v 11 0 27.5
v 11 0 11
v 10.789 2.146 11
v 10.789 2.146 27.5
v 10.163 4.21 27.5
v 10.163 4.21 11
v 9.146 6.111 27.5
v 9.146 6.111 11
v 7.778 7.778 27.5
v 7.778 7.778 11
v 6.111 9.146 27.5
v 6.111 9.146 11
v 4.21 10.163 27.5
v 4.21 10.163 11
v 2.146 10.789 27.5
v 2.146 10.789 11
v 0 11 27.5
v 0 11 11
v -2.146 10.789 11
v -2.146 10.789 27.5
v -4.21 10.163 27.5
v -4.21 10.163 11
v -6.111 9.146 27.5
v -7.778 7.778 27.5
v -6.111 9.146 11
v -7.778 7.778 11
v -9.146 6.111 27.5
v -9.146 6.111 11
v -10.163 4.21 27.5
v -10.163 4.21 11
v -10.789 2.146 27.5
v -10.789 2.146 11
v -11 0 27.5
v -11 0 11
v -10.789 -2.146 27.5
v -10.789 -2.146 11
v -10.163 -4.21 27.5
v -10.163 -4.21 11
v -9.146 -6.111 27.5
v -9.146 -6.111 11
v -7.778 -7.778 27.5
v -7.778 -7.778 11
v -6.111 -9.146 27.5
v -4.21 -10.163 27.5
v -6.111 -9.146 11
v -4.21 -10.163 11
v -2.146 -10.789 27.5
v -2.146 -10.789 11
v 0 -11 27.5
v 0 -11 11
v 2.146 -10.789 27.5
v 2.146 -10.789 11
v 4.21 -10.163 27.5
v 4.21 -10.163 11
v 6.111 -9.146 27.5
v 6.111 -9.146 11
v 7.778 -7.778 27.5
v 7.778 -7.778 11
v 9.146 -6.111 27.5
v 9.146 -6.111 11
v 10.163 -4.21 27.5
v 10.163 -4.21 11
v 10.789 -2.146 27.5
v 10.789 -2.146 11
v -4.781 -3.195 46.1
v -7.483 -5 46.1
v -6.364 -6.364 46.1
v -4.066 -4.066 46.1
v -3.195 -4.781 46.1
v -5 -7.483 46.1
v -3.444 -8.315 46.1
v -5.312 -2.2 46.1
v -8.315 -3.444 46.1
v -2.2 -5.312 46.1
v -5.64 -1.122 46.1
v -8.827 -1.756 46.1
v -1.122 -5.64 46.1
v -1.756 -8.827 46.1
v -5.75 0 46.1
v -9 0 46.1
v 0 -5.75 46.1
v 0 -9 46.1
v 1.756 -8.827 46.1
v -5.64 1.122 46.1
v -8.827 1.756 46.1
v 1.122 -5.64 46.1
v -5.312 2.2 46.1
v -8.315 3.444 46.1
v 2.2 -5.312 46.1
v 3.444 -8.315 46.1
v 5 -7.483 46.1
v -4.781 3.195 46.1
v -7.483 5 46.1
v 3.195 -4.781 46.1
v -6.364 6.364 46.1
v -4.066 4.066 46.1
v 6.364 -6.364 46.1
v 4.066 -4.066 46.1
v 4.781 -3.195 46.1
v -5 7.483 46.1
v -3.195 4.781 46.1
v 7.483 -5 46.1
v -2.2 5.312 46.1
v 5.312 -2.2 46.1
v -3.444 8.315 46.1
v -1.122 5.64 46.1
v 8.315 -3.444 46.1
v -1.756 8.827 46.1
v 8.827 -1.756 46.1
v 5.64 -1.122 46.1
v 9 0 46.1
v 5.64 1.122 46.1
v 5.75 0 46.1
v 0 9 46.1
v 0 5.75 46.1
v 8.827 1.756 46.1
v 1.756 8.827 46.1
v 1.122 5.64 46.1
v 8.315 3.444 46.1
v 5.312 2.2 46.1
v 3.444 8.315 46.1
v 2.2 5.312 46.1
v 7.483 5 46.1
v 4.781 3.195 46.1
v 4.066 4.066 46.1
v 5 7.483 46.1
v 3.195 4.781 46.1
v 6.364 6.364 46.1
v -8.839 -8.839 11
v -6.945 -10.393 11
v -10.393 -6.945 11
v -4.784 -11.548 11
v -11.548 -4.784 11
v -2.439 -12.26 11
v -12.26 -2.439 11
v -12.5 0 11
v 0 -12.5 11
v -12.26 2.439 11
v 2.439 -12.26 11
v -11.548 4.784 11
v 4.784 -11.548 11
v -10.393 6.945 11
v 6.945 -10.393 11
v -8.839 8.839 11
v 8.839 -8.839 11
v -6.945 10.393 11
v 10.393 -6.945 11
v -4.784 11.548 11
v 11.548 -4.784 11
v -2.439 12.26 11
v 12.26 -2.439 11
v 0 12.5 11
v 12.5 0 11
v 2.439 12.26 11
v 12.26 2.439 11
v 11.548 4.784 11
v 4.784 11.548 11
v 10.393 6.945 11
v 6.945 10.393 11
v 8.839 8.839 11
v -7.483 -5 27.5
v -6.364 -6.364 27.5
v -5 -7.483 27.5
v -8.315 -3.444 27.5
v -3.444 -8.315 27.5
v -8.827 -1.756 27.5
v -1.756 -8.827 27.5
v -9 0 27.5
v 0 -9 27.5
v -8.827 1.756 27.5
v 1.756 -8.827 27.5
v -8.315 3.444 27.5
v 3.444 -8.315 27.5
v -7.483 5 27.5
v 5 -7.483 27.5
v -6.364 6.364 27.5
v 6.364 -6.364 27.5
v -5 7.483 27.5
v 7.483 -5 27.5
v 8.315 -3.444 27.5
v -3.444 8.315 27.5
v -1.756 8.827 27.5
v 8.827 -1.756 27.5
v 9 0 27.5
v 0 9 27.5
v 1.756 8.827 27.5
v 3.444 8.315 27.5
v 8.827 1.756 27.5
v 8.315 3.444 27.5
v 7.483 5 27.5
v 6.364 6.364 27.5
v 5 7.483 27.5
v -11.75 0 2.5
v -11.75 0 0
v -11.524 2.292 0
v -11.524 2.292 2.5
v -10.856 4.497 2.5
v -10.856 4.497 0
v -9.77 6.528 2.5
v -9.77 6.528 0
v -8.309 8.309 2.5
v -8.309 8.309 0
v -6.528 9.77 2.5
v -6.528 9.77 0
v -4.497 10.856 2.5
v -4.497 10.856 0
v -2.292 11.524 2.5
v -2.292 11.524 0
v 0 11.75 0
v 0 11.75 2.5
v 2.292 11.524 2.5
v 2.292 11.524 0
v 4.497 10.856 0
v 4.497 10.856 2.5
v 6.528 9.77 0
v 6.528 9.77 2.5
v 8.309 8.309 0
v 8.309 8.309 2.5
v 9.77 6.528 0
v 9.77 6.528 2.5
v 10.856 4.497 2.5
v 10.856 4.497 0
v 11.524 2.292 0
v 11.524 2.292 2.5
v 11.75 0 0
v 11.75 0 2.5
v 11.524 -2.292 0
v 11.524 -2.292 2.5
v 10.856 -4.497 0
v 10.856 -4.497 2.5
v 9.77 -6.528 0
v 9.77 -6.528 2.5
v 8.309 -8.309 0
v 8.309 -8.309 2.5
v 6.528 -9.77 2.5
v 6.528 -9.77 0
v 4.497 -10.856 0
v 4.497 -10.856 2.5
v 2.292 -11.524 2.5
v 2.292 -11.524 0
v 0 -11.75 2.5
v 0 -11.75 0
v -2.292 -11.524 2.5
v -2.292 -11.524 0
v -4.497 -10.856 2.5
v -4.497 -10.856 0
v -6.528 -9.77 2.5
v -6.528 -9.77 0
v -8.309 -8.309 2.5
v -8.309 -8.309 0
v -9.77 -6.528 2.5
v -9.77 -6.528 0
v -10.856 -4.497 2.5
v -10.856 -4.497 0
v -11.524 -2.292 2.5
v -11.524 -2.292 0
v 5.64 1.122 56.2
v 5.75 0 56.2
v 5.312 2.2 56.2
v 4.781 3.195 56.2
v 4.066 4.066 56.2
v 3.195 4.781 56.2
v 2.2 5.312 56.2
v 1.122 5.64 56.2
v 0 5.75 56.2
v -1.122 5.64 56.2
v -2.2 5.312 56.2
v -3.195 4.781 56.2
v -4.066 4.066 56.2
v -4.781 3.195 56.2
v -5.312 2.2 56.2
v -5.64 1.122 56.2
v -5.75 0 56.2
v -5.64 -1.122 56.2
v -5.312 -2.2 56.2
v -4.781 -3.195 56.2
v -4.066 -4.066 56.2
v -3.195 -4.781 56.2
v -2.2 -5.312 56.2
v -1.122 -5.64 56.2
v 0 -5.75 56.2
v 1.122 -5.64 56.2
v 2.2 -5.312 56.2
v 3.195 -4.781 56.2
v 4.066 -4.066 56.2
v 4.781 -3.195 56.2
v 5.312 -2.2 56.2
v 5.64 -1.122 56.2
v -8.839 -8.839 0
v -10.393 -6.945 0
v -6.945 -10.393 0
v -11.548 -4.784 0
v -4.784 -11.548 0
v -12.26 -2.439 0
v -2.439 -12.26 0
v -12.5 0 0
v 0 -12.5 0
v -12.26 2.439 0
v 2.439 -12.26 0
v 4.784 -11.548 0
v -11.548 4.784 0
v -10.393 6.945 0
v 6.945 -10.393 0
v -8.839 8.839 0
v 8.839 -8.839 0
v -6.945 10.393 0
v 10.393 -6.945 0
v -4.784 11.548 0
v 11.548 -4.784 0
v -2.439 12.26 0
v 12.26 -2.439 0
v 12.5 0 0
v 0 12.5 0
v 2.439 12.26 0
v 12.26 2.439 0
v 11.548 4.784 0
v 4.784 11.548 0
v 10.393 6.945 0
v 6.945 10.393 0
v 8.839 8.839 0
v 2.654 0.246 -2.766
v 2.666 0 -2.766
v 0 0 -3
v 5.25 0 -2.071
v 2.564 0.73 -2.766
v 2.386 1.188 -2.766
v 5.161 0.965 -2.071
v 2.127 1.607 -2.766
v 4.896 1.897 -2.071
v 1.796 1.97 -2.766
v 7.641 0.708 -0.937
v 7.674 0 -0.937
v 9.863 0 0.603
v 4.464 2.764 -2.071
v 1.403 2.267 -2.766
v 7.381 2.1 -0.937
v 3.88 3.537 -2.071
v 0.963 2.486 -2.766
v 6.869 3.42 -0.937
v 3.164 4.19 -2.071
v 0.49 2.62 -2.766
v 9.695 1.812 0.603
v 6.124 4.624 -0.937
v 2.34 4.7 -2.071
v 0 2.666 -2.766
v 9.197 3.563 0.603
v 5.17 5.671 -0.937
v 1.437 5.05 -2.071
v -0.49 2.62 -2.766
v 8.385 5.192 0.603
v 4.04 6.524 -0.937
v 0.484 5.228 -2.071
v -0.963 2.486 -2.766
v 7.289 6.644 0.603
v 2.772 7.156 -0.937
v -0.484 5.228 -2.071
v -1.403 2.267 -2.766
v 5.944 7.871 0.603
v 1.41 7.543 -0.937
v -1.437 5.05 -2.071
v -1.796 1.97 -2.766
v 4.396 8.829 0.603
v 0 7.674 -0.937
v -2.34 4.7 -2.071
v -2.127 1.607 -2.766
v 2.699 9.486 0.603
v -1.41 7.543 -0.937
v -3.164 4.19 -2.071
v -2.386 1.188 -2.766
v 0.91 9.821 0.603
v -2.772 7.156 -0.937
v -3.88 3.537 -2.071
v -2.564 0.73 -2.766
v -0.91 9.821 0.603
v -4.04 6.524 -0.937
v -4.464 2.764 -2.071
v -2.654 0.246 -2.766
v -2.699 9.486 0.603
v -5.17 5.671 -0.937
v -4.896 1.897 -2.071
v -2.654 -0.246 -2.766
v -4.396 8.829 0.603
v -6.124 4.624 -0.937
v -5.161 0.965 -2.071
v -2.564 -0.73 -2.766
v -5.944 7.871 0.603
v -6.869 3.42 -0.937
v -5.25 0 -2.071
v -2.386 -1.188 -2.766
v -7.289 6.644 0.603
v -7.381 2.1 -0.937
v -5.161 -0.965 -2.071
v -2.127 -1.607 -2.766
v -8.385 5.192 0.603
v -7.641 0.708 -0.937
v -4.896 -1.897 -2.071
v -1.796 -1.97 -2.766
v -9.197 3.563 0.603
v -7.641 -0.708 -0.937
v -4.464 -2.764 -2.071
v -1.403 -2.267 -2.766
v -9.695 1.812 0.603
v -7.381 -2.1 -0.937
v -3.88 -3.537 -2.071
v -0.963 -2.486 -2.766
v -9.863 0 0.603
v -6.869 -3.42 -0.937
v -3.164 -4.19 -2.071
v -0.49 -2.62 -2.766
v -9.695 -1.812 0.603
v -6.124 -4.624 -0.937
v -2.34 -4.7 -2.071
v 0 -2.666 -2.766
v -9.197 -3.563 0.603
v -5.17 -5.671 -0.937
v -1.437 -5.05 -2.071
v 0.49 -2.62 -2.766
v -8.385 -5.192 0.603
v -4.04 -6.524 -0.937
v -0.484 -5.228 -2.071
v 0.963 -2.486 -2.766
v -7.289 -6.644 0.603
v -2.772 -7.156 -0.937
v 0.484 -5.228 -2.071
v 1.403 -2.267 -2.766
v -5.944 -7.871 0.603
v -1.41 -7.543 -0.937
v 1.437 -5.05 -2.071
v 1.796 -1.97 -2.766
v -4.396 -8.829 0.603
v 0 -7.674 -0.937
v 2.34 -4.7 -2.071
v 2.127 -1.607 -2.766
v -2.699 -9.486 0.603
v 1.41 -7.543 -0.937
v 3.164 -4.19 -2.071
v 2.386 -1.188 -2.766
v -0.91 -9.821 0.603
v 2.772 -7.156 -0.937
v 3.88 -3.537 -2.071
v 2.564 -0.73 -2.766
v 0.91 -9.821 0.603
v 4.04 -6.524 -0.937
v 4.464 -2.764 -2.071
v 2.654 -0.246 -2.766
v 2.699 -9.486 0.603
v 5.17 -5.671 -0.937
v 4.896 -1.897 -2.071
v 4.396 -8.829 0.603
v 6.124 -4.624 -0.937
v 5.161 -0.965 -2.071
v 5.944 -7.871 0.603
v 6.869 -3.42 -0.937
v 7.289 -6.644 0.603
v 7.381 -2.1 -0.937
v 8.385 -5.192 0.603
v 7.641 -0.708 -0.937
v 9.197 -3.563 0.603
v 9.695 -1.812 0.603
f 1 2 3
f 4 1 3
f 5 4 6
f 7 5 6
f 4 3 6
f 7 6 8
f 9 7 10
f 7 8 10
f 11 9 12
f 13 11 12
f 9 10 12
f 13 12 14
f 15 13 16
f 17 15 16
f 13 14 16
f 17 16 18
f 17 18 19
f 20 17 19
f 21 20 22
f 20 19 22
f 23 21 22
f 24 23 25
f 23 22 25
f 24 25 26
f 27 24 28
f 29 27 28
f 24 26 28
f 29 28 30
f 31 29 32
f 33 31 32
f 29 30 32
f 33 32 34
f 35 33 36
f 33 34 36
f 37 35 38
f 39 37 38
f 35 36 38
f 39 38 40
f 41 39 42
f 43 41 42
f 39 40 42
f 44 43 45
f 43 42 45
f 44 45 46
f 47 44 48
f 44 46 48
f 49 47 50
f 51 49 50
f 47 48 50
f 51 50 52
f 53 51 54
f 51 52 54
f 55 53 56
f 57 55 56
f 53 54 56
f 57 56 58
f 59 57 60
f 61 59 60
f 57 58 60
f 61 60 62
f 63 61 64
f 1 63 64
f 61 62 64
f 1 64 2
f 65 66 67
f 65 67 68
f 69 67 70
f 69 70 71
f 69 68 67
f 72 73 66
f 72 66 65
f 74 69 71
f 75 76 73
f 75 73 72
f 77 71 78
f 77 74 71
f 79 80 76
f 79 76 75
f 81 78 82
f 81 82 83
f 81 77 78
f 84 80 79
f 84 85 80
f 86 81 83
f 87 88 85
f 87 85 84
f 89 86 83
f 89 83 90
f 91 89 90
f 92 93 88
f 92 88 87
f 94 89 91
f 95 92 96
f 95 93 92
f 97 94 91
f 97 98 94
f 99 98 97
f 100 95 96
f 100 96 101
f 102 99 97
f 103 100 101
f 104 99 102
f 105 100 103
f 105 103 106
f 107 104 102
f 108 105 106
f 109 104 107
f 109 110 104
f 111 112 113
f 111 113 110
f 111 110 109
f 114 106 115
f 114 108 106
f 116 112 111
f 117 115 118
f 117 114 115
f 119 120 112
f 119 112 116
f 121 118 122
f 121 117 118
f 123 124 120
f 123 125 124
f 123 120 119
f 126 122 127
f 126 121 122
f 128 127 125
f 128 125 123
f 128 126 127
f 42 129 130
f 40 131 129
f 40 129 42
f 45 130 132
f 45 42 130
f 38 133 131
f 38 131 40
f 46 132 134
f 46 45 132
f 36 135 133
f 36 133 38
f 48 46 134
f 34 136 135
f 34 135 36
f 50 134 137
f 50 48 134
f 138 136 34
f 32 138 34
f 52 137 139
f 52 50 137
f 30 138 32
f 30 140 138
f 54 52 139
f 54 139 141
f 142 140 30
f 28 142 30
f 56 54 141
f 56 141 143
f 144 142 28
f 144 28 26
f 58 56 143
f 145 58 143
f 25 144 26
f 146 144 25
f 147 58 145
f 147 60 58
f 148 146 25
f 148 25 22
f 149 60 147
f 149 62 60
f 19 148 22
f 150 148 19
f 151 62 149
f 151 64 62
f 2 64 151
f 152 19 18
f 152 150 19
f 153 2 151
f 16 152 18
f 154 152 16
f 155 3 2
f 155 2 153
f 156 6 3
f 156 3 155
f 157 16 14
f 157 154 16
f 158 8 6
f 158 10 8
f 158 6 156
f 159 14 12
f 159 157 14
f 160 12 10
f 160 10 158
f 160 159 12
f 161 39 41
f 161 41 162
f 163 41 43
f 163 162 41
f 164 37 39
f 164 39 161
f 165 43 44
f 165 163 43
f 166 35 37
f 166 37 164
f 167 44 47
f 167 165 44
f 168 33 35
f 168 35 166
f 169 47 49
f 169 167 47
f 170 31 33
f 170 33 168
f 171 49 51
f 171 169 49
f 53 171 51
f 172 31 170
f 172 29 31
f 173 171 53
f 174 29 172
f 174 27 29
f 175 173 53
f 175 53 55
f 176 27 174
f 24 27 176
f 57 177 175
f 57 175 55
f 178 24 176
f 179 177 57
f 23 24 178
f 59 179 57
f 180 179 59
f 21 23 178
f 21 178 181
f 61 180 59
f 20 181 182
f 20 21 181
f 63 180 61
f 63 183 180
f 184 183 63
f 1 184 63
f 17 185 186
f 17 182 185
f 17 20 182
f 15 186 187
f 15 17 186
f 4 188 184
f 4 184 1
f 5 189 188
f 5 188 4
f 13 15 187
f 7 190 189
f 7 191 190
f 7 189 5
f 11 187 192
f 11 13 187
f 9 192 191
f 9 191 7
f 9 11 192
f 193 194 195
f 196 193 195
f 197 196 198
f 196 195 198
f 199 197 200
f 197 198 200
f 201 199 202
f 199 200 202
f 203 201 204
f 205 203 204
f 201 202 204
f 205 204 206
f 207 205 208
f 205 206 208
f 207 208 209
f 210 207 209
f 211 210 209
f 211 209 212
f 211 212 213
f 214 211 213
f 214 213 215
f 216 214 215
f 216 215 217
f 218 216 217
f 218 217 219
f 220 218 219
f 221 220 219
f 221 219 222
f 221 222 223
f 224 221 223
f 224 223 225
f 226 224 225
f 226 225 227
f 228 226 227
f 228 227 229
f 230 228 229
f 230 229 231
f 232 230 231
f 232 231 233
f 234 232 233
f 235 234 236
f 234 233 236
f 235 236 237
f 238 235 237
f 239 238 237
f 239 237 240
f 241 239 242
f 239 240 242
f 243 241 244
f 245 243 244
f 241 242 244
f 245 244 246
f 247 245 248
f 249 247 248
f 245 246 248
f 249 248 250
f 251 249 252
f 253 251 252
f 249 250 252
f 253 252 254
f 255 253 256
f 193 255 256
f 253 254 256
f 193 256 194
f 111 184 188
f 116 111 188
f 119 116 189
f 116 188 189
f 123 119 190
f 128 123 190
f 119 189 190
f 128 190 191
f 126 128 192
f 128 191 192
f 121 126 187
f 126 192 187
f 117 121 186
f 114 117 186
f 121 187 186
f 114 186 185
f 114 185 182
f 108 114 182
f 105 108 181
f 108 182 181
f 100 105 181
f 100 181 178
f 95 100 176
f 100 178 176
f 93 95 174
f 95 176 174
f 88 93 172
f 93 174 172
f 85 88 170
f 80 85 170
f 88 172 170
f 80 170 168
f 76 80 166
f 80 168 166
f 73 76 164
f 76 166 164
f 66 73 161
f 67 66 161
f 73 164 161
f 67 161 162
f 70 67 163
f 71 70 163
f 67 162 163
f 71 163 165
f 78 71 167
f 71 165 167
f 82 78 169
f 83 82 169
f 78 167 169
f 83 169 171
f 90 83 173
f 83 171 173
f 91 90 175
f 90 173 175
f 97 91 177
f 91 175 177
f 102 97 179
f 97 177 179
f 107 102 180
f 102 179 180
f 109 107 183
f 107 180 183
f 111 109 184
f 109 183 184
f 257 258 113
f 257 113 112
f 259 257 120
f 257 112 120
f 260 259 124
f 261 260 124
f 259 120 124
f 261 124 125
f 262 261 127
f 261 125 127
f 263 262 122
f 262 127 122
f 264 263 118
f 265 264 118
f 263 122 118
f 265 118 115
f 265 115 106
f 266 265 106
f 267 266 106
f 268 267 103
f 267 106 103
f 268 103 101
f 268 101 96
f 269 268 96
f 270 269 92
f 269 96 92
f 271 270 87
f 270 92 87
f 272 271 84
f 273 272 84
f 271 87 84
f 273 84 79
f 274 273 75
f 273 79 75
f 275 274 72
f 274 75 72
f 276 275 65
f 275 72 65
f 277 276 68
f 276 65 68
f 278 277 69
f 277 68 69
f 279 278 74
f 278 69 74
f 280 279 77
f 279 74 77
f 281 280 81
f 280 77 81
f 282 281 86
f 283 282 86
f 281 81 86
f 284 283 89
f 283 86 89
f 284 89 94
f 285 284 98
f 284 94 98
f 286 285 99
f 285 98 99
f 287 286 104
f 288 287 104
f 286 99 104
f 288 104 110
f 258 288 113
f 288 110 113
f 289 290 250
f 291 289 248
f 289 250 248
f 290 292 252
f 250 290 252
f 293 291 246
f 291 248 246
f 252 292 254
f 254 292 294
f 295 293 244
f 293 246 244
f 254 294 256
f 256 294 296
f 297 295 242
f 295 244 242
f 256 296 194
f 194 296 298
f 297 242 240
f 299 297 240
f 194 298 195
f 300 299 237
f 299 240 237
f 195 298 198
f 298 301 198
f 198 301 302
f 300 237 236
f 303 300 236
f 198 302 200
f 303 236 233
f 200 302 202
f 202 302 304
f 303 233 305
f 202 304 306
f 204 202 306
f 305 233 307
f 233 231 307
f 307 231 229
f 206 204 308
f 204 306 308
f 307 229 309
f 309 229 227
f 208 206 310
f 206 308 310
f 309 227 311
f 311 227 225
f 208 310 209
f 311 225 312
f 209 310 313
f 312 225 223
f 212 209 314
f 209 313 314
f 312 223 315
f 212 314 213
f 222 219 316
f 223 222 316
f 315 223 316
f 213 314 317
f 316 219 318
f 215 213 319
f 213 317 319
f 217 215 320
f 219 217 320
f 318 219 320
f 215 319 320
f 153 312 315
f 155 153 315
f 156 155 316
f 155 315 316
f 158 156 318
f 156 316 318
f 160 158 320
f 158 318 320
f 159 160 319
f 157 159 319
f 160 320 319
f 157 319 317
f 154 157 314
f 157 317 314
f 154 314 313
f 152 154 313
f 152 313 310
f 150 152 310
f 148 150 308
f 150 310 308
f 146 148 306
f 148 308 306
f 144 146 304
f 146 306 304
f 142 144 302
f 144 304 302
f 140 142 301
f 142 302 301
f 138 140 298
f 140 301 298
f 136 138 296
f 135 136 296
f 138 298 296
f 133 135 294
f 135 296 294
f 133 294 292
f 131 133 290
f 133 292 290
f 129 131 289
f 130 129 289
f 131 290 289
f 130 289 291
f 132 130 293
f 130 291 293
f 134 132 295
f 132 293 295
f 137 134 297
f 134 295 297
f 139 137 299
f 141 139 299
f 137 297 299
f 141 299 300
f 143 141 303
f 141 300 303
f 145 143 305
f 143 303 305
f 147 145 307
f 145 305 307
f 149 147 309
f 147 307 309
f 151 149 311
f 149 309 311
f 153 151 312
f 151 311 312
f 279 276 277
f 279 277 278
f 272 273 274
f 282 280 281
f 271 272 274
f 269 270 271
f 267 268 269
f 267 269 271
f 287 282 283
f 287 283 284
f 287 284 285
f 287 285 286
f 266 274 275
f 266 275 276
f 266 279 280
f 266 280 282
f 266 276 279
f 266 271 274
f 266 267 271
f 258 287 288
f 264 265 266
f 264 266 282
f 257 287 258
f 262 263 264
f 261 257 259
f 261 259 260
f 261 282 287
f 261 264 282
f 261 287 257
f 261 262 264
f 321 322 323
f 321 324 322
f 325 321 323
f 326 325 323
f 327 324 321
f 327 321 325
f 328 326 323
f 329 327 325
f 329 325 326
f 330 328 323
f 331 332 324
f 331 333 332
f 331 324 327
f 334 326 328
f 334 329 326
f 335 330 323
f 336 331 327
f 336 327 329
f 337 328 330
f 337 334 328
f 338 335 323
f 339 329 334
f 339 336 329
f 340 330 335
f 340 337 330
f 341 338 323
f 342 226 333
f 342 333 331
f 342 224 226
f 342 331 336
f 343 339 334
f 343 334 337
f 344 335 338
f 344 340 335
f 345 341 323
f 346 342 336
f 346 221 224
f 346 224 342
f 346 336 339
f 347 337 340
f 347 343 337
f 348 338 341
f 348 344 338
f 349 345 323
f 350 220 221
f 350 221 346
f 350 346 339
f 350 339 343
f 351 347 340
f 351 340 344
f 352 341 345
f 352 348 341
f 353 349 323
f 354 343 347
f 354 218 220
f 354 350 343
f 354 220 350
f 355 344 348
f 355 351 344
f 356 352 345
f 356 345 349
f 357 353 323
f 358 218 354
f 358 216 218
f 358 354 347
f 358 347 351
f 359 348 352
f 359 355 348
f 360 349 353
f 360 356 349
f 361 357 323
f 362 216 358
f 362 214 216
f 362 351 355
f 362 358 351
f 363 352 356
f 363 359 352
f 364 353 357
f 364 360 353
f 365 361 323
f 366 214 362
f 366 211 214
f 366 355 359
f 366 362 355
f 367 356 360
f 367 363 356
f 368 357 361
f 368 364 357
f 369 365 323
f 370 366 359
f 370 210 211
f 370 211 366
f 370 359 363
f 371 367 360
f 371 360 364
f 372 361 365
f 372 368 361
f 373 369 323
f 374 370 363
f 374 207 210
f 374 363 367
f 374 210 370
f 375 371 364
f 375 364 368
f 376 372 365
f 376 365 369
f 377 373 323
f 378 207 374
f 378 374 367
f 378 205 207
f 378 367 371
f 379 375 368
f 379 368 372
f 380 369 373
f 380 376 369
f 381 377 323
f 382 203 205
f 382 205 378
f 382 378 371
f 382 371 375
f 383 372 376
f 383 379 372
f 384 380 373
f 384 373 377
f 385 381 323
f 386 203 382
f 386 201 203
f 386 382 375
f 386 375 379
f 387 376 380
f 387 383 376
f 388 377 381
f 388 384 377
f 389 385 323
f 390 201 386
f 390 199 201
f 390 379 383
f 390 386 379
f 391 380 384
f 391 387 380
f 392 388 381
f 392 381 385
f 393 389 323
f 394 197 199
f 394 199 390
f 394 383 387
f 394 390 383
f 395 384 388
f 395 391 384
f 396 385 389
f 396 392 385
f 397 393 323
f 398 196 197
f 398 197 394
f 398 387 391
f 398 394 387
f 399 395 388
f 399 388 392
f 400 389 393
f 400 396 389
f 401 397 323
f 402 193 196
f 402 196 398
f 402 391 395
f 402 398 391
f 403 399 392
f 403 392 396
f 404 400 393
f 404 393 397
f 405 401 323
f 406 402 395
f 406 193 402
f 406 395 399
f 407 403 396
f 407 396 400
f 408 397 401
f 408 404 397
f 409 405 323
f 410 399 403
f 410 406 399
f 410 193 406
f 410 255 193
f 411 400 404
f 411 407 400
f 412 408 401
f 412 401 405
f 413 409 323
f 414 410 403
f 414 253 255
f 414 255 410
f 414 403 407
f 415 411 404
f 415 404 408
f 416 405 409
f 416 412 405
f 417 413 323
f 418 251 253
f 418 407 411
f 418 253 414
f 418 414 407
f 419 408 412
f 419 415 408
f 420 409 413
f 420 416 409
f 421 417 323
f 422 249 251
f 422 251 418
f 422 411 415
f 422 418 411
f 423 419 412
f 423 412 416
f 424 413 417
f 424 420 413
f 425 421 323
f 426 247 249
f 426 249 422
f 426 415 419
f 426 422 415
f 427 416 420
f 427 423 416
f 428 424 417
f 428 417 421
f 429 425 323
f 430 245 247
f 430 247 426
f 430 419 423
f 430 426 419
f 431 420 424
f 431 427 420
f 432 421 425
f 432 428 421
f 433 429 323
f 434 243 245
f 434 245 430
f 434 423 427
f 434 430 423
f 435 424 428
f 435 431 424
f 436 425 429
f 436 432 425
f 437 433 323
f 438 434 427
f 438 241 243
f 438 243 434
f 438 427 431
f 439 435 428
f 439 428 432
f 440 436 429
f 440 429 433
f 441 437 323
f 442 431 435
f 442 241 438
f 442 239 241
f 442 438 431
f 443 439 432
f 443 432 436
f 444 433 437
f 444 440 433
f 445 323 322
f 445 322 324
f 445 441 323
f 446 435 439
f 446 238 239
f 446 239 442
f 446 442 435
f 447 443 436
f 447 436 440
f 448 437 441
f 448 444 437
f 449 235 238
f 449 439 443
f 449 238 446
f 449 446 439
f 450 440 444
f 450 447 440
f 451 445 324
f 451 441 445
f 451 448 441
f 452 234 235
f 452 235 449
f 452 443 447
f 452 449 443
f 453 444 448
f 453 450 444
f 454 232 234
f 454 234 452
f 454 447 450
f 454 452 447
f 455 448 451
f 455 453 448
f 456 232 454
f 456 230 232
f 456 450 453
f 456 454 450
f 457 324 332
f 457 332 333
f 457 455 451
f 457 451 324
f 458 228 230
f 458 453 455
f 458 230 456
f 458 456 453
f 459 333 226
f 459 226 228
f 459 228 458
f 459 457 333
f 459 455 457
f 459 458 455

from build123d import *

# Parameters (mm, degrees)
SKETCH1_R           = 12.5
BOSS_EXTRUDE1_DEPTH = 11
SKETCH2_R           = 11
BOSS_EXTRUDE2_DEPTH = 16.5
SKETCH3_R           = 9
BOSS_EXTRUDE3_DEPTH = 18.6
SKETCH4_R           = 5.75
BOSS_EXTRUDE4_DEPTH = 10.1
SKETCH5_R           = 11.75
CUT_EXTRUDE1_DEPTH  = 4.5
BOSS_EXTRUDE5_START = 2
SKETCH6_R           = 11.75
BOSS_EXTRUDE5_DEPTH = 2


# Read off the part's stored shape, not the designer's step: Dome1
with BuildPart() as part:
    # Sketch1 → Boss-Extrude1 (new body)
    with BuildSketch(Plane.XY):
        Circle(SKETCH1_R)
    extrude(amount=BOSS_EXTRUDE1_DEPTH)

    # Sketch2 → Boss-Extrude2 (add)
    with BuildSketch(Plane.XY.offset(11)):
        Circle(SKETCH2_R)
    extrude(amount=BOSS_EXTRUDE2_DEPTH)

    # Sketch3 → Boss-Extrude3 (add)
    with BuildSketch(Plane.XY.offset(27.5)):
        Circle(SKETCH3_R)
    extrude(amount=BOSS_EXTRUDE3_DEPTH)

    # Sketch4 → Boss-Extrude4 (add)
    with BuildSketch(Plane.XY.offset(46.1)):
        Circle(SKETCH4_R)
    extrude(amount=BOSS_EXTRUDE4_DEPTH)

    # Sketch5 → Cut-Extrude1 (cut)
    with BuildSketch(Plane(origin=(0, 0, 0), x_dir=(-1, 0, 0), z_dir=(0, 0, -1))):
        Circle(SKETCH5_R)
    extrude(amount=-CUT_EXTRUDE1_DEPTH, mode=Mode.SUBTRACT)

    # Sketch6 → Boss-Extrude5 (add)
    with BuildSketch(Plane(origin=(0, 0, 4.5), x_dir=(-1, 0, 0), z_dir=(0, 0, -1)).offset(BOSS_EXTRUDE5_START)):
        Circle(SKETCH6_R)
    extrude(amount=-BOSS_EXTRUDE5_DEPTH)

    # Dome1 outline → Dome1 (revolve)
    with BuildSketch(Plane.XZ):
        with BuildLine():
            Line((0, 2.500000012), (0, -3))
            ThreePointArc((0, -3), (6.48676538, -1.556953293), (11.75000001, 2.500000012))
            Line((11.75000001, 2.500000012), (0, 2.500000012))
        make_face()
    revolve(axis=Axis((0, 0, 0), (0, 0, 1)))


solid = part.part
